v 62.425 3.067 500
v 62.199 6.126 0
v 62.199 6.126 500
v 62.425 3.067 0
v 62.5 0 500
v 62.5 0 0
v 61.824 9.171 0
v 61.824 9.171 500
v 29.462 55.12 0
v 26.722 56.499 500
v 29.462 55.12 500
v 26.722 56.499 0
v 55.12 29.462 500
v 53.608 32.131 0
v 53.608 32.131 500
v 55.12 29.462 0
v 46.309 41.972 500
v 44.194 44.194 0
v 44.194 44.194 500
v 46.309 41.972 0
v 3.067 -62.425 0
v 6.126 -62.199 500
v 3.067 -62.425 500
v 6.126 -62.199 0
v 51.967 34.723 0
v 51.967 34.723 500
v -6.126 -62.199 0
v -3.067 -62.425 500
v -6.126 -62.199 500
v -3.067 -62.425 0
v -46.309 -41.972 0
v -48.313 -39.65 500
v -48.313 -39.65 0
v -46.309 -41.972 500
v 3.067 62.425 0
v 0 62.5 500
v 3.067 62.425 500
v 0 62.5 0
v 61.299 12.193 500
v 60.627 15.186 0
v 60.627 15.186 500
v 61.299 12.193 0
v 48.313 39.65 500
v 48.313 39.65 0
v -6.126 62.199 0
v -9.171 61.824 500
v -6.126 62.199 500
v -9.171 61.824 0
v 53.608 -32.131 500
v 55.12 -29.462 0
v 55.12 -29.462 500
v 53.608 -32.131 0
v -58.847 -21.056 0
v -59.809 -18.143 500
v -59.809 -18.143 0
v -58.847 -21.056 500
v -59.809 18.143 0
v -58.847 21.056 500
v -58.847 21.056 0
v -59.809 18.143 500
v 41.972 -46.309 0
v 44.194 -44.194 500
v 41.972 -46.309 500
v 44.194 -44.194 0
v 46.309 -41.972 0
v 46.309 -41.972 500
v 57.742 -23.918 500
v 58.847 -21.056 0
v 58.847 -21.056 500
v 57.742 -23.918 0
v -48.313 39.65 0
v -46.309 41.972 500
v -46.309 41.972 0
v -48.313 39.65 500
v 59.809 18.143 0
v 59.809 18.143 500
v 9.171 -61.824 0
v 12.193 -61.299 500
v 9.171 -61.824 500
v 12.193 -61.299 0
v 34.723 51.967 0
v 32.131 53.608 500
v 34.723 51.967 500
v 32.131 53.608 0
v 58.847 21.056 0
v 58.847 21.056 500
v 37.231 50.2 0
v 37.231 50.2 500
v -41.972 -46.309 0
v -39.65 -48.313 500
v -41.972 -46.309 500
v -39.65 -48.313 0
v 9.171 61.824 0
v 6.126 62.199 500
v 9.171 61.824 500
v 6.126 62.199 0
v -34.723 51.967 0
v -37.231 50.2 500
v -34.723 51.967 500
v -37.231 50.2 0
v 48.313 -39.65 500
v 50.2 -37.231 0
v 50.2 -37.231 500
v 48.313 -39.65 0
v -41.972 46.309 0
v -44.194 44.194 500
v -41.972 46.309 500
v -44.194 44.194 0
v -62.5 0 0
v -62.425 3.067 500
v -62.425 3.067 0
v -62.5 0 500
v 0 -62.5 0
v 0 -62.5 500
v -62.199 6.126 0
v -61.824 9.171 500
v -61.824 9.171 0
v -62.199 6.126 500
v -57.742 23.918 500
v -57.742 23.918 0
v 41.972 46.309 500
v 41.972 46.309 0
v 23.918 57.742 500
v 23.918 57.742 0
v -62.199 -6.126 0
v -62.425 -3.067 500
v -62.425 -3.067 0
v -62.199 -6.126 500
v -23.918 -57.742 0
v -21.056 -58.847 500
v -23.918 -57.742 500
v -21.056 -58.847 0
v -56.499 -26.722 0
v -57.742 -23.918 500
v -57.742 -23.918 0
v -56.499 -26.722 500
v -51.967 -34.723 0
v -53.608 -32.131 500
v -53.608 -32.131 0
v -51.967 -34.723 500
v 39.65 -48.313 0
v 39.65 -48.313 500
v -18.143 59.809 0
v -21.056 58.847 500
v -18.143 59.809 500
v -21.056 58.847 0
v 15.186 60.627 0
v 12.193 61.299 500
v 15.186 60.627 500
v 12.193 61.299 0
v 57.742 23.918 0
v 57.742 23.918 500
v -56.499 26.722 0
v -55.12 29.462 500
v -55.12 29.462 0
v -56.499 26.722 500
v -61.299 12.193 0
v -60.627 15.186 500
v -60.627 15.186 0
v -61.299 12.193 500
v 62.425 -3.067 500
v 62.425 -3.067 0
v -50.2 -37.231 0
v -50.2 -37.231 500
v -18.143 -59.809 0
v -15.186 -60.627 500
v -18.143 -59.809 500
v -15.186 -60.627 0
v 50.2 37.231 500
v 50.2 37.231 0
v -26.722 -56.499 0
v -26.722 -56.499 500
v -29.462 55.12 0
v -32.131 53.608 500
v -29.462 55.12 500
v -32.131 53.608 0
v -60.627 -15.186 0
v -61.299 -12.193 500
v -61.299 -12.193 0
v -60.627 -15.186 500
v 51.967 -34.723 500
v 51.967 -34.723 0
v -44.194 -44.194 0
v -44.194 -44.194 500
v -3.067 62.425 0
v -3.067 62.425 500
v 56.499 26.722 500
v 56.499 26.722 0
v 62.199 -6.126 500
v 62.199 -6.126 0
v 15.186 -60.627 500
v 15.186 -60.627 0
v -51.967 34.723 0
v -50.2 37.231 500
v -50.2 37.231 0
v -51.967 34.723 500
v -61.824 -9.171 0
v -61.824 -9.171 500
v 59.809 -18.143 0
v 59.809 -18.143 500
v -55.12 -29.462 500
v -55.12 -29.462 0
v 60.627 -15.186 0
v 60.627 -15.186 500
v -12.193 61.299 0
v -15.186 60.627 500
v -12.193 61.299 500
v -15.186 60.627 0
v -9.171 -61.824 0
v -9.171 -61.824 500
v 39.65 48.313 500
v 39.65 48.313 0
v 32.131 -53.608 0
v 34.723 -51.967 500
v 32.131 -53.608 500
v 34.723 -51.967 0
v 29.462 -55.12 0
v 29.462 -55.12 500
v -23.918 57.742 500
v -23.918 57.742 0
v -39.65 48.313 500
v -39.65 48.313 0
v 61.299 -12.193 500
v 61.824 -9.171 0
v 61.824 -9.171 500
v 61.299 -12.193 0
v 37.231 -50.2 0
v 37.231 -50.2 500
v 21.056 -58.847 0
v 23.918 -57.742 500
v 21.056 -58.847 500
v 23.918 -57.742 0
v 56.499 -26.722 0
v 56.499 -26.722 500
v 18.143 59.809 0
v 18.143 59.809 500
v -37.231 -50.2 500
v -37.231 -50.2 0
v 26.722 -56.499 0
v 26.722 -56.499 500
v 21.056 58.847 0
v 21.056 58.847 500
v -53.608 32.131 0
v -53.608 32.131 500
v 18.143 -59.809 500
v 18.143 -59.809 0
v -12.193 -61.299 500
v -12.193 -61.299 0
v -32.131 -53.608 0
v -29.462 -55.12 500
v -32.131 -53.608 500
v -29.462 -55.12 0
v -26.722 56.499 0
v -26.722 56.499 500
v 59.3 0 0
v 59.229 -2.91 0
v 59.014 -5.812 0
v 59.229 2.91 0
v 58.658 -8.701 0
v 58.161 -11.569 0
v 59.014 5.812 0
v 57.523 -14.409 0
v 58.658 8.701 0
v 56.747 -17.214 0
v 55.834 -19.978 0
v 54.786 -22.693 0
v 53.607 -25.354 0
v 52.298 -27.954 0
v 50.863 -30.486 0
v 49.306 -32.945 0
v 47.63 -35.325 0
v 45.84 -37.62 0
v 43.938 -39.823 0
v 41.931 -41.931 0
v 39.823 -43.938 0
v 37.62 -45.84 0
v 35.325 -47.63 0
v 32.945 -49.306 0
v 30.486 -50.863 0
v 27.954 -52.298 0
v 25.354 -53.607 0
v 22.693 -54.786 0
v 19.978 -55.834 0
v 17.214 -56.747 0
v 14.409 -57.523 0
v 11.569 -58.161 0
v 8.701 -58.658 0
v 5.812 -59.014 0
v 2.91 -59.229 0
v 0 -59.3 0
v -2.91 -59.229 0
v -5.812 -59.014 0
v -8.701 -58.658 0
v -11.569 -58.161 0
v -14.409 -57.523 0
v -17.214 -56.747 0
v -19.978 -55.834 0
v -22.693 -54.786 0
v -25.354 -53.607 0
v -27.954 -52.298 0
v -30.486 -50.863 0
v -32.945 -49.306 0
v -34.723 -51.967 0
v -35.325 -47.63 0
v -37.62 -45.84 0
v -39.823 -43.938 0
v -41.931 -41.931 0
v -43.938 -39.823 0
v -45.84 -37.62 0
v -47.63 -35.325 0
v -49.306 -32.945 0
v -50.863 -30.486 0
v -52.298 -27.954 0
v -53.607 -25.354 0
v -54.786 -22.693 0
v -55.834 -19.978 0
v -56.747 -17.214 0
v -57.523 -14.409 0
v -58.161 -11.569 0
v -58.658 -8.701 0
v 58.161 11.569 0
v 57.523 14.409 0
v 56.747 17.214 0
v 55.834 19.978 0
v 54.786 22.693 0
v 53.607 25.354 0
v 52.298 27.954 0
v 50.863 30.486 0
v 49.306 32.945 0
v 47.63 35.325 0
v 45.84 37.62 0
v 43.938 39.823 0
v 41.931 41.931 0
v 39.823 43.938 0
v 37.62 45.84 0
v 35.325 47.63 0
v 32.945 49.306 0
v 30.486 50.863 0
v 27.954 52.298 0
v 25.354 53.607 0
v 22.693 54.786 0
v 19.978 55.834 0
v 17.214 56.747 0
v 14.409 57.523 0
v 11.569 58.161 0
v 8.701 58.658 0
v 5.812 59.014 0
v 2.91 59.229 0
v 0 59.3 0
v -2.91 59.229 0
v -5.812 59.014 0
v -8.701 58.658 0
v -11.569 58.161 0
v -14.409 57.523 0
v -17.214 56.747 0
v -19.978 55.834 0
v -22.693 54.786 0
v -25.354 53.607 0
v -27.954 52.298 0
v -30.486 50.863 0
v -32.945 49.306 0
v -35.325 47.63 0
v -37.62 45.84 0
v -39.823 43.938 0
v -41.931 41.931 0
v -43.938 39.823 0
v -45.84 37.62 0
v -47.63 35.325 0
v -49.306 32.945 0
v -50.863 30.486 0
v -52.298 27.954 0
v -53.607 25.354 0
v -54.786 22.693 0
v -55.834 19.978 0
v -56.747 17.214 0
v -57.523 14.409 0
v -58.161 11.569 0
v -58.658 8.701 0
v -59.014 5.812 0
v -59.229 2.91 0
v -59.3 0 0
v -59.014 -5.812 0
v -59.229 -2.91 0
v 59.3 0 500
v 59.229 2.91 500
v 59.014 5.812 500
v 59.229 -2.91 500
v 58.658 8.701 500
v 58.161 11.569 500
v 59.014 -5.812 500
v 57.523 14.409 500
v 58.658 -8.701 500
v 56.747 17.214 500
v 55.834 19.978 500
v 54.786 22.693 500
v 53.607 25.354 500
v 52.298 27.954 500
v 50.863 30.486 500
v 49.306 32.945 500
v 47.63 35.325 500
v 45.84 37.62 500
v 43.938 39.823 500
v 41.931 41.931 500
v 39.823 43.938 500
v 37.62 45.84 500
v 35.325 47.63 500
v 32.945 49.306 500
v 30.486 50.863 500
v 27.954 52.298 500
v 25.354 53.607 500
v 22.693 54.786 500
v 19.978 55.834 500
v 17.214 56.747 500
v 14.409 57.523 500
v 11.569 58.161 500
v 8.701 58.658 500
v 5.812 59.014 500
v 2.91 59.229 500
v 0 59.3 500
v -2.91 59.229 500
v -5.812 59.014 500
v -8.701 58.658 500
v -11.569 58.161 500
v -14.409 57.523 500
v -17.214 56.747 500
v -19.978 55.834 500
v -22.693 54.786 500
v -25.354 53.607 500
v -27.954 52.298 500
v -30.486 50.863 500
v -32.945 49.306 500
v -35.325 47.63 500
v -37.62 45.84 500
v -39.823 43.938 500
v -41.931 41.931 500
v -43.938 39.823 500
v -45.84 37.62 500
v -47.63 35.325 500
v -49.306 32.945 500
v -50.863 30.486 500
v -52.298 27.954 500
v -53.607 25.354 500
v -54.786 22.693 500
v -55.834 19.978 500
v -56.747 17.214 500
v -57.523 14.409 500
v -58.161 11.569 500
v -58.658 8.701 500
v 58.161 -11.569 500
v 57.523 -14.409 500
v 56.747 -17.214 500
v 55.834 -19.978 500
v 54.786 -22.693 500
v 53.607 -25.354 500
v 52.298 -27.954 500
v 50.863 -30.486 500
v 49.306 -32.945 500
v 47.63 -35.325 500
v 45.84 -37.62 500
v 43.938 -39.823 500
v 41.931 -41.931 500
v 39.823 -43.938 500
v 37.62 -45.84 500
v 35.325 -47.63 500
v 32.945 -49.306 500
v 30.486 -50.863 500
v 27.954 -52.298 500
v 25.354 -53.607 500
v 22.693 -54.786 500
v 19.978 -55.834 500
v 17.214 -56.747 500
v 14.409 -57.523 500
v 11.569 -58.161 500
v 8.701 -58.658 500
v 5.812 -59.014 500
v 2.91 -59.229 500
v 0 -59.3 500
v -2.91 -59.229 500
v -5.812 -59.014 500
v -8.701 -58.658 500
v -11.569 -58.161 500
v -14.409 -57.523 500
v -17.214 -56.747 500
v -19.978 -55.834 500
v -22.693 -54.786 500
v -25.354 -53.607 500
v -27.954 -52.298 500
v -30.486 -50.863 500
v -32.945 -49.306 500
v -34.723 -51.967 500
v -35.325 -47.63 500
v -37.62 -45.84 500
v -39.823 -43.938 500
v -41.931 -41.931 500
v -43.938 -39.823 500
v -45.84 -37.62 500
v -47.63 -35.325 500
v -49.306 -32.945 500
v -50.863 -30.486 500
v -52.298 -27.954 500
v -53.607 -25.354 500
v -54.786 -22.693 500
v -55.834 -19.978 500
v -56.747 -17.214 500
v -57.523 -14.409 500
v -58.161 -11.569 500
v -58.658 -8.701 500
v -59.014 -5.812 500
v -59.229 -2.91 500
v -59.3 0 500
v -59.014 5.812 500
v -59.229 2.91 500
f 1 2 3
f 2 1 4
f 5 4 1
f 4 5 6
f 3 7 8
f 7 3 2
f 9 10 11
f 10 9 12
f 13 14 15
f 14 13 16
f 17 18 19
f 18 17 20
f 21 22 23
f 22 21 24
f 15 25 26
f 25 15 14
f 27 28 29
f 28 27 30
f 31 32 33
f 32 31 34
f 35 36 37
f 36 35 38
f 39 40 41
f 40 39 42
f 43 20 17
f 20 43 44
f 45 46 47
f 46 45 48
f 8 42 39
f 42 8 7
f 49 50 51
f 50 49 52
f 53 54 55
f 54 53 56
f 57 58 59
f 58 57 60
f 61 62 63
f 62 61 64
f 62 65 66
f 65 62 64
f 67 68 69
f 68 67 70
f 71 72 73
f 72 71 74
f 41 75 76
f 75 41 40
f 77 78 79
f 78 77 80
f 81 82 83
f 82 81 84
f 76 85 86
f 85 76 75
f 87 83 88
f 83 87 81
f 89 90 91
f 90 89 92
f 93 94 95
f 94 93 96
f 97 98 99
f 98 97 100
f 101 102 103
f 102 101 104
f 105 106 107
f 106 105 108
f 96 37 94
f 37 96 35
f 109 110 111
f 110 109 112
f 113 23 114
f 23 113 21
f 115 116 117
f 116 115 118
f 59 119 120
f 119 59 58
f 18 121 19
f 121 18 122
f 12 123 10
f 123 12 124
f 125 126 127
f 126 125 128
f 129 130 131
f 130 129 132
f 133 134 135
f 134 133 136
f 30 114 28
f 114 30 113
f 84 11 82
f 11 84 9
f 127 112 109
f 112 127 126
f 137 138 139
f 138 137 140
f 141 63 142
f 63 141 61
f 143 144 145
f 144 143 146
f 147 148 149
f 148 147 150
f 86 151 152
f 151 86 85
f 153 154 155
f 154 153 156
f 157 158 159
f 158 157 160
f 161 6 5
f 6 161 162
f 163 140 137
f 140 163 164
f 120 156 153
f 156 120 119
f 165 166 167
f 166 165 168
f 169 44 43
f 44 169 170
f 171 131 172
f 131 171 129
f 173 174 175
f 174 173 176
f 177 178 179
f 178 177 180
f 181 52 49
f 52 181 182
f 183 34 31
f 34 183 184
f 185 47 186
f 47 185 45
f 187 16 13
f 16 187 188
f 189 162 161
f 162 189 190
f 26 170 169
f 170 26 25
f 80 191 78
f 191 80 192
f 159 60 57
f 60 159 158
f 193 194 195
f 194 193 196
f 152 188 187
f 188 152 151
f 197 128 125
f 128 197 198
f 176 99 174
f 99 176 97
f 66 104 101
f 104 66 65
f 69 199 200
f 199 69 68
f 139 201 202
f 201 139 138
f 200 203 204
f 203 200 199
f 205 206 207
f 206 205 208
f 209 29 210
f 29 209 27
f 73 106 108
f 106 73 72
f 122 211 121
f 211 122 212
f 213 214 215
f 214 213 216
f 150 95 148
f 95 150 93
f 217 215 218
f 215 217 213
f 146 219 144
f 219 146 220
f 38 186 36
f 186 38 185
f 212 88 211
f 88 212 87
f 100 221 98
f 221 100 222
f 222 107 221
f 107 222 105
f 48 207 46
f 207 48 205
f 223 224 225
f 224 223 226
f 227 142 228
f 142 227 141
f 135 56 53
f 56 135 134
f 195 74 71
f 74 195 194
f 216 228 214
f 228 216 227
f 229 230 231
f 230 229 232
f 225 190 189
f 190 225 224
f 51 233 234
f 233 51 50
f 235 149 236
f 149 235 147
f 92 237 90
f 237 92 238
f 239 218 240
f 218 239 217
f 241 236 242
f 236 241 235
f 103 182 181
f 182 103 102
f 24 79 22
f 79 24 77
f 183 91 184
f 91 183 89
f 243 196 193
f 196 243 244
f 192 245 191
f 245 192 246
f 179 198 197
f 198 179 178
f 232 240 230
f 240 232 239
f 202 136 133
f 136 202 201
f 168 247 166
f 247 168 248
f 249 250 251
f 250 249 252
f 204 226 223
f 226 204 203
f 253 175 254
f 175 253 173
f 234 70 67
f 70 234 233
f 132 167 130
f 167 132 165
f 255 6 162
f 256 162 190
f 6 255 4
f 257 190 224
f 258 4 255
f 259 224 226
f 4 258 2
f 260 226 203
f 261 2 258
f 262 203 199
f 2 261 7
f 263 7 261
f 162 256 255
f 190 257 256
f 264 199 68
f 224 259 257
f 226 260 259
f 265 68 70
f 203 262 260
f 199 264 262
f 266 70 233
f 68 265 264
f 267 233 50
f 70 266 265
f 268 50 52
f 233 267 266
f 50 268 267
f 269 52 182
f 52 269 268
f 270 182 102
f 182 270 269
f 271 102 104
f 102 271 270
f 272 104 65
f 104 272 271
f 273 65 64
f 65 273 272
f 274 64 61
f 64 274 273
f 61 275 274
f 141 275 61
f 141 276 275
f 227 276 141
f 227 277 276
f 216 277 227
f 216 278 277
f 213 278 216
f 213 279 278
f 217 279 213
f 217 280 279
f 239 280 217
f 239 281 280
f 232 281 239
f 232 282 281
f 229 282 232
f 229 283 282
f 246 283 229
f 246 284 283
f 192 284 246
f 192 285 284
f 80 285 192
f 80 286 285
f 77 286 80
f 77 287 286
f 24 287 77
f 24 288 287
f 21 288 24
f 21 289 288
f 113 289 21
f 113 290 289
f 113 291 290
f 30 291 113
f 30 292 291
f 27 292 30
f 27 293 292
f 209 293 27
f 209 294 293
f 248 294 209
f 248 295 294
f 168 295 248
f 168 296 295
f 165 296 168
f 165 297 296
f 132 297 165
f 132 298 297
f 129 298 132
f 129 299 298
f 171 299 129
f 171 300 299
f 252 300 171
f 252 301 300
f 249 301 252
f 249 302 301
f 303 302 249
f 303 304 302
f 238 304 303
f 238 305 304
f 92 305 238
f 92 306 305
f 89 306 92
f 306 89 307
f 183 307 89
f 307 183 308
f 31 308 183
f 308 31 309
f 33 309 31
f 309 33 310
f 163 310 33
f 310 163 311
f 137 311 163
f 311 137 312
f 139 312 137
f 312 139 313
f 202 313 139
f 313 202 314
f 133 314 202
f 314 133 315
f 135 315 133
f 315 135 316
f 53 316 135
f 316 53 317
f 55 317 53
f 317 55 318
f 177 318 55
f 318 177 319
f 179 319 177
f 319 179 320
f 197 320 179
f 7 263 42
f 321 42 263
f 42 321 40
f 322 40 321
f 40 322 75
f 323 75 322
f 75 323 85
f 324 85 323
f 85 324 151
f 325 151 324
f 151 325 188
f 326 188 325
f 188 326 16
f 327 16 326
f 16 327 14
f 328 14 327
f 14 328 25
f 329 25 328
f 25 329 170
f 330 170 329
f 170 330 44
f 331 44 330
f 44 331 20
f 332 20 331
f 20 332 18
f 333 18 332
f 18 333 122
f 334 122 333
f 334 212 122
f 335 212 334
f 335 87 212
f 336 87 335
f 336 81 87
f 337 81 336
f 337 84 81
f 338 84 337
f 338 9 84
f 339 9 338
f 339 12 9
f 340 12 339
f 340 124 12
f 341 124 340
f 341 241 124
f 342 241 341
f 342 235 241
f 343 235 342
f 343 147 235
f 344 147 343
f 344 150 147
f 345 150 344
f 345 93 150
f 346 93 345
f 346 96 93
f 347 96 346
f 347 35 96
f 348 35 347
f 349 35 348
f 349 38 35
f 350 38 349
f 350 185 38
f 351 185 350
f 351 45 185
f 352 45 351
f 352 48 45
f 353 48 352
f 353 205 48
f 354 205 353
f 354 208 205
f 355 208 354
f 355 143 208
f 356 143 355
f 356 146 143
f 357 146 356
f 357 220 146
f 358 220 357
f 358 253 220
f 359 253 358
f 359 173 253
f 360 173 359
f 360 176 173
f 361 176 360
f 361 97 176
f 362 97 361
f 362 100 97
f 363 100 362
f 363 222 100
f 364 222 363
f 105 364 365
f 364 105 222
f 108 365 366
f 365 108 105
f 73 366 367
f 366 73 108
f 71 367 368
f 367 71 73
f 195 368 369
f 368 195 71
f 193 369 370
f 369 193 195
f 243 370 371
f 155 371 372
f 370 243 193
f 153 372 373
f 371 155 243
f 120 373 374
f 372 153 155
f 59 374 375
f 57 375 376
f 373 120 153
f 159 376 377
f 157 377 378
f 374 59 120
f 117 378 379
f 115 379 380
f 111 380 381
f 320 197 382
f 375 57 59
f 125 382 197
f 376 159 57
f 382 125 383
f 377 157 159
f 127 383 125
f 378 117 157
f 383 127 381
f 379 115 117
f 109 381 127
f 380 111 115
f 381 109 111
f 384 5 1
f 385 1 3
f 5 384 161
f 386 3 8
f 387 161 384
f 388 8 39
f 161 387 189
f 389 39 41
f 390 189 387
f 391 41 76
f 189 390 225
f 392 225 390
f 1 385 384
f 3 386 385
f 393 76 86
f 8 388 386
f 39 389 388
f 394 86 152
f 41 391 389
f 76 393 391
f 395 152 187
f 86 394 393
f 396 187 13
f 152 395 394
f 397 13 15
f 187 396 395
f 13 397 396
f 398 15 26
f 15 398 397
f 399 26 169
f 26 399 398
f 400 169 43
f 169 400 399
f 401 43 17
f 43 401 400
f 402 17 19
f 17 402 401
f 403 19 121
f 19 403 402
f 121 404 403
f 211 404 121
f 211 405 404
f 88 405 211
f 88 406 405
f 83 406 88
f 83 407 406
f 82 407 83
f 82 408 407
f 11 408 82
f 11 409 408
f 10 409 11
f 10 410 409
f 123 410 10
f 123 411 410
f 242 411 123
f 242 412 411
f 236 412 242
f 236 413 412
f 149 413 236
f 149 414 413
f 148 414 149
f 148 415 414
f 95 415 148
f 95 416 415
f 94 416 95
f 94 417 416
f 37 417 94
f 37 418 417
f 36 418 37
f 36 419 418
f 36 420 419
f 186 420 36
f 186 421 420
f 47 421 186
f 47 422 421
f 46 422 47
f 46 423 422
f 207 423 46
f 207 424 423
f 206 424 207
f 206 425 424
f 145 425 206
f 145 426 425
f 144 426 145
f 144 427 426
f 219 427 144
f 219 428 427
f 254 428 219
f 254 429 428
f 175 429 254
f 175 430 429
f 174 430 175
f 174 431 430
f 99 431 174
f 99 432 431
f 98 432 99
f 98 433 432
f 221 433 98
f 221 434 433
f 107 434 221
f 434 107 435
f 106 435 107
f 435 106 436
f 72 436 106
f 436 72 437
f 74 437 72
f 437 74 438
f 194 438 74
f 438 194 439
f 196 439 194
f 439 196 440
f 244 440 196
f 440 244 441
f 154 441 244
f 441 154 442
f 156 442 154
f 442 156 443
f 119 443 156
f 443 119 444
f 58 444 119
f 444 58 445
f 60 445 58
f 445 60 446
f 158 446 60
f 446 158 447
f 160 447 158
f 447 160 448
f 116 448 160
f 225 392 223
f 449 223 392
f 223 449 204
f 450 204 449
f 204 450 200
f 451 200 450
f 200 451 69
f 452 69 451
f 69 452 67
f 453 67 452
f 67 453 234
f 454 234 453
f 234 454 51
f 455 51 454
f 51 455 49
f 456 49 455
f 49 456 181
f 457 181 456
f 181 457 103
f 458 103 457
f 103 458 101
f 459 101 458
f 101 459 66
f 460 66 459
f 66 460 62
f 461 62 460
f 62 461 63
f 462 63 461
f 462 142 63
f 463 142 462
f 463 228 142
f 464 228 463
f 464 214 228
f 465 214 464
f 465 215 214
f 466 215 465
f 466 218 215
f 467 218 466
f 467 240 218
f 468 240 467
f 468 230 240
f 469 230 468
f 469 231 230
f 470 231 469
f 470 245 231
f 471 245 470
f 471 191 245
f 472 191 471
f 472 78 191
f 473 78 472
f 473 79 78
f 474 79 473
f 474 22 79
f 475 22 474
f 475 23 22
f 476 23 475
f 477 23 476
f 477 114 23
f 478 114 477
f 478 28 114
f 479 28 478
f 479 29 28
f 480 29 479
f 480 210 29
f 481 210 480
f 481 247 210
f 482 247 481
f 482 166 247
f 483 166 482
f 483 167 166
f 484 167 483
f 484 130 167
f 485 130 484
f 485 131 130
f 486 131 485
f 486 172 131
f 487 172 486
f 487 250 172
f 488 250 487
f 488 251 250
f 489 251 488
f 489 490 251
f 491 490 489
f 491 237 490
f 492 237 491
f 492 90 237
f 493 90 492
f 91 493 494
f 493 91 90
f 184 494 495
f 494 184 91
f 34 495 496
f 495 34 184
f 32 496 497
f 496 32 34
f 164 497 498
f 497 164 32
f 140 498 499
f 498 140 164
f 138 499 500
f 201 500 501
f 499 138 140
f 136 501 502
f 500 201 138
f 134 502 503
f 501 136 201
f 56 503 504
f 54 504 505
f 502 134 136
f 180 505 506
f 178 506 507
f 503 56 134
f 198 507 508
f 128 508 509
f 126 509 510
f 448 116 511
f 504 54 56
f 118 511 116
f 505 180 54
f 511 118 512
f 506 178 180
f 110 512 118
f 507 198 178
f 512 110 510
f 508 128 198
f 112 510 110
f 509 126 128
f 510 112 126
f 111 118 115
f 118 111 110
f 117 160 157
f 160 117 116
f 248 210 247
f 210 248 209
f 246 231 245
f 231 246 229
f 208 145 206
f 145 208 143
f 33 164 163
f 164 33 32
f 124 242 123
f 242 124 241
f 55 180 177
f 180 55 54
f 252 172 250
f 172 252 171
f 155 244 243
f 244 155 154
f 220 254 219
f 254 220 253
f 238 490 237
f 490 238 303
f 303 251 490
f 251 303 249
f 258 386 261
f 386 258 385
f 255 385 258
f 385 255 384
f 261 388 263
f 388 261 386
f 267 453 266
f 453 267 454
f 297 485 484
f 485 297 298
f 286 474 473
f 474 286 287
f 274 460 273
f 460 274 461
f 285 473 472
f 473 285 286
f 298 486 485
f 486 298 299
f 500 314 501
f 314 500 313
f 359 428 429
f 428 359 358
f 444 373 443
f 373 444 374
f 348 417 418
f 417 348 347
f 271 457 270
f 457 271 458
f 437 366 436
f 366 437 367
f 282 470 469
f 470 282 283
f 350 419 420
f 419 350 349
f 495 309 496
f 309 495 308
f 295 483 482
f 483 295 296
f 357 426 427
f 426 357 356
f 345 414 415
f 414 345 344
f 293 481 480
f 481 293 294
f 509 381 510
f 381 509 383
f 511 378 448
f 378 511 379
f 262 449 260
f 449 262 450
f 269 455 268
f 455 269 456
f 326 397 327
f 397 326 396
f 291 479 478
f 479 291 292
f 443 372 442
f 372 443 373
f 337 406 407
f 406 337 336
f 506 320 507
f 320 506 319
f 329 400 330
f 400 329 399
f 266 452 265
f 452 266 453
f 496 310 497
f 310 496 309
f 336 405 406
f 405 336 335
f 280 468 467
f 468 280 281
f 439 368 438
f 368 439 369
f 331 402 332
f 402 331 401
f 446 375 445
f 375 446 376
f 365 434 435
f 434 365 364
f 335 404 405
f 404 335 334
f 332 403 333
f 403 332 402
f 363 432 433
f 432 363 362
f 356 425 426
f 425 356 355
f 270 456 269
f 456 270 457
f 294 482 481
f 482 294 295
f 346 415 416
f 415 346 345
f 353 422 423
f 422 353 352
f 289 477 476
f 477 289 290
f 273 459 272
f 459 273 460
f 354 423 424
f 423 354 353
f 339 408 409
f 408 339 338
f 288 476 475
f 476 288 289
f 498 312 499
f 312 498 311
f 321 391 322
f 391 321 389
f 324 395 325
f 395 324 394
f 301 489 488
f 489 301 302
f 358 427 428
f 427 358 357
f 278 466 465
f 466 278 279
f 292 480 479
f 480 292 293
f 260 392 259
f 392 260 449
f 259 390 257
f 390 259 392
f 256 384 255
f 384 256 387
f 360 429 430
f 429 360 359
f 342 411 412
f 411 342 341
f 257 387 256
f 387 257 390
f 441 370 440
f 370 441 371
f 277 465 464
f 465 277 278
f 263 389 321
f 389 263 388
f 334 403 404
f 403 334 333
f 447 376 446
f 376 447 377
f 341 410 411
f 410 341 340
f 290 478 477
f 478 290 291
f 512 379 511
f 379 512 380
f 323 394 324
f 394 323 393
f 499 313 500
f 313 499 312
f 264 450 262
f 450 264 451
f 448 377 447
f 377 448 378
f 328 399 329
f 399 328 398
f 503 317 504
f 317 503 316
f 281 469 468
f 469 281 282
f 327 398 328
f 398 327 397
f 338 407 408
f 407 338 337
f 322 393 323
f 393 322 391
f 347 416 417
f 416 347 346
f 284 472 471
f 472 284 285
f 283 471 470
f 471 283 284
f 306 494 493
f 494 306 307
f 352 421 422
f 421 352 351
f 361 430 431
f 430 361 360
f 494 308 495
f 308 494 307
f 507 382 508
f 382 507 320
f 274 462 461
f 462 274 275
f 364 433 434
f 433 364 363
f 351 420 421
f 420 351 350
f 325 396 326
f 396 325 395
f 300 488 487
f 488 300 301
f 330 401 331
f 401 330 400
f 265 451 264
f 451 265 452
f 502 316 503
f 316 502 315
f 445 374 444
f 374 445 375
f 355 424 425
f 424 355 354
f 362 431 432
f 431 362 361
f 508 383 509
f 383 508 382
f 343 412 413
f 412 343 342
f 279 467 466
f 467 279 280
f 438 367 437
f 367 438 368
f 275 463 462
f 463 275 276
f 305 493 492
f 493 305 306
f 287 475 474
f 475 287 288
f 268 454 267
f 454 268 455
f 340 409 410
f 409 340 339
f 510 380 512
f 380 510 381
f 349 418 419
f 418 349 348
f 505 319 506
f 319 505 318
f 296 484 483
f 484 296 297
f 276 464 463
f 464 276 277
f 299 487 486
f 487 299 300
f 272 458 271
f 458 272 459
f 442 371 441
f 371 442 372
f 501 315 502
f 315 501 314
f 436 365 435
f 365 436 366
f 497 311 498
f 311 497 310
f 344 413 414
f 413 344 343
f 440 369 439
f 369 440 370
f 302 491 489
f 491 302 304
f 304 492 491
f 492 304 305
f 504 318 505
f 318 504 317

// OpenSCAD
$fn = 128;

// HT pipe parameters (approximate, in mm)
outer_d = 125;      // nominal outer diameter
length  = 500;      // pipe length
wall    = 3.2;      // typical HT wall thickness (approx.)

inner_d = outer_d - 2*wall;

difference() {
    cylinder(h = length, d = outer_d, center = false);
    translate([0,0,-0.1])
        cylinder(h = length + 0.2, d = inner_d, center = false);
}
